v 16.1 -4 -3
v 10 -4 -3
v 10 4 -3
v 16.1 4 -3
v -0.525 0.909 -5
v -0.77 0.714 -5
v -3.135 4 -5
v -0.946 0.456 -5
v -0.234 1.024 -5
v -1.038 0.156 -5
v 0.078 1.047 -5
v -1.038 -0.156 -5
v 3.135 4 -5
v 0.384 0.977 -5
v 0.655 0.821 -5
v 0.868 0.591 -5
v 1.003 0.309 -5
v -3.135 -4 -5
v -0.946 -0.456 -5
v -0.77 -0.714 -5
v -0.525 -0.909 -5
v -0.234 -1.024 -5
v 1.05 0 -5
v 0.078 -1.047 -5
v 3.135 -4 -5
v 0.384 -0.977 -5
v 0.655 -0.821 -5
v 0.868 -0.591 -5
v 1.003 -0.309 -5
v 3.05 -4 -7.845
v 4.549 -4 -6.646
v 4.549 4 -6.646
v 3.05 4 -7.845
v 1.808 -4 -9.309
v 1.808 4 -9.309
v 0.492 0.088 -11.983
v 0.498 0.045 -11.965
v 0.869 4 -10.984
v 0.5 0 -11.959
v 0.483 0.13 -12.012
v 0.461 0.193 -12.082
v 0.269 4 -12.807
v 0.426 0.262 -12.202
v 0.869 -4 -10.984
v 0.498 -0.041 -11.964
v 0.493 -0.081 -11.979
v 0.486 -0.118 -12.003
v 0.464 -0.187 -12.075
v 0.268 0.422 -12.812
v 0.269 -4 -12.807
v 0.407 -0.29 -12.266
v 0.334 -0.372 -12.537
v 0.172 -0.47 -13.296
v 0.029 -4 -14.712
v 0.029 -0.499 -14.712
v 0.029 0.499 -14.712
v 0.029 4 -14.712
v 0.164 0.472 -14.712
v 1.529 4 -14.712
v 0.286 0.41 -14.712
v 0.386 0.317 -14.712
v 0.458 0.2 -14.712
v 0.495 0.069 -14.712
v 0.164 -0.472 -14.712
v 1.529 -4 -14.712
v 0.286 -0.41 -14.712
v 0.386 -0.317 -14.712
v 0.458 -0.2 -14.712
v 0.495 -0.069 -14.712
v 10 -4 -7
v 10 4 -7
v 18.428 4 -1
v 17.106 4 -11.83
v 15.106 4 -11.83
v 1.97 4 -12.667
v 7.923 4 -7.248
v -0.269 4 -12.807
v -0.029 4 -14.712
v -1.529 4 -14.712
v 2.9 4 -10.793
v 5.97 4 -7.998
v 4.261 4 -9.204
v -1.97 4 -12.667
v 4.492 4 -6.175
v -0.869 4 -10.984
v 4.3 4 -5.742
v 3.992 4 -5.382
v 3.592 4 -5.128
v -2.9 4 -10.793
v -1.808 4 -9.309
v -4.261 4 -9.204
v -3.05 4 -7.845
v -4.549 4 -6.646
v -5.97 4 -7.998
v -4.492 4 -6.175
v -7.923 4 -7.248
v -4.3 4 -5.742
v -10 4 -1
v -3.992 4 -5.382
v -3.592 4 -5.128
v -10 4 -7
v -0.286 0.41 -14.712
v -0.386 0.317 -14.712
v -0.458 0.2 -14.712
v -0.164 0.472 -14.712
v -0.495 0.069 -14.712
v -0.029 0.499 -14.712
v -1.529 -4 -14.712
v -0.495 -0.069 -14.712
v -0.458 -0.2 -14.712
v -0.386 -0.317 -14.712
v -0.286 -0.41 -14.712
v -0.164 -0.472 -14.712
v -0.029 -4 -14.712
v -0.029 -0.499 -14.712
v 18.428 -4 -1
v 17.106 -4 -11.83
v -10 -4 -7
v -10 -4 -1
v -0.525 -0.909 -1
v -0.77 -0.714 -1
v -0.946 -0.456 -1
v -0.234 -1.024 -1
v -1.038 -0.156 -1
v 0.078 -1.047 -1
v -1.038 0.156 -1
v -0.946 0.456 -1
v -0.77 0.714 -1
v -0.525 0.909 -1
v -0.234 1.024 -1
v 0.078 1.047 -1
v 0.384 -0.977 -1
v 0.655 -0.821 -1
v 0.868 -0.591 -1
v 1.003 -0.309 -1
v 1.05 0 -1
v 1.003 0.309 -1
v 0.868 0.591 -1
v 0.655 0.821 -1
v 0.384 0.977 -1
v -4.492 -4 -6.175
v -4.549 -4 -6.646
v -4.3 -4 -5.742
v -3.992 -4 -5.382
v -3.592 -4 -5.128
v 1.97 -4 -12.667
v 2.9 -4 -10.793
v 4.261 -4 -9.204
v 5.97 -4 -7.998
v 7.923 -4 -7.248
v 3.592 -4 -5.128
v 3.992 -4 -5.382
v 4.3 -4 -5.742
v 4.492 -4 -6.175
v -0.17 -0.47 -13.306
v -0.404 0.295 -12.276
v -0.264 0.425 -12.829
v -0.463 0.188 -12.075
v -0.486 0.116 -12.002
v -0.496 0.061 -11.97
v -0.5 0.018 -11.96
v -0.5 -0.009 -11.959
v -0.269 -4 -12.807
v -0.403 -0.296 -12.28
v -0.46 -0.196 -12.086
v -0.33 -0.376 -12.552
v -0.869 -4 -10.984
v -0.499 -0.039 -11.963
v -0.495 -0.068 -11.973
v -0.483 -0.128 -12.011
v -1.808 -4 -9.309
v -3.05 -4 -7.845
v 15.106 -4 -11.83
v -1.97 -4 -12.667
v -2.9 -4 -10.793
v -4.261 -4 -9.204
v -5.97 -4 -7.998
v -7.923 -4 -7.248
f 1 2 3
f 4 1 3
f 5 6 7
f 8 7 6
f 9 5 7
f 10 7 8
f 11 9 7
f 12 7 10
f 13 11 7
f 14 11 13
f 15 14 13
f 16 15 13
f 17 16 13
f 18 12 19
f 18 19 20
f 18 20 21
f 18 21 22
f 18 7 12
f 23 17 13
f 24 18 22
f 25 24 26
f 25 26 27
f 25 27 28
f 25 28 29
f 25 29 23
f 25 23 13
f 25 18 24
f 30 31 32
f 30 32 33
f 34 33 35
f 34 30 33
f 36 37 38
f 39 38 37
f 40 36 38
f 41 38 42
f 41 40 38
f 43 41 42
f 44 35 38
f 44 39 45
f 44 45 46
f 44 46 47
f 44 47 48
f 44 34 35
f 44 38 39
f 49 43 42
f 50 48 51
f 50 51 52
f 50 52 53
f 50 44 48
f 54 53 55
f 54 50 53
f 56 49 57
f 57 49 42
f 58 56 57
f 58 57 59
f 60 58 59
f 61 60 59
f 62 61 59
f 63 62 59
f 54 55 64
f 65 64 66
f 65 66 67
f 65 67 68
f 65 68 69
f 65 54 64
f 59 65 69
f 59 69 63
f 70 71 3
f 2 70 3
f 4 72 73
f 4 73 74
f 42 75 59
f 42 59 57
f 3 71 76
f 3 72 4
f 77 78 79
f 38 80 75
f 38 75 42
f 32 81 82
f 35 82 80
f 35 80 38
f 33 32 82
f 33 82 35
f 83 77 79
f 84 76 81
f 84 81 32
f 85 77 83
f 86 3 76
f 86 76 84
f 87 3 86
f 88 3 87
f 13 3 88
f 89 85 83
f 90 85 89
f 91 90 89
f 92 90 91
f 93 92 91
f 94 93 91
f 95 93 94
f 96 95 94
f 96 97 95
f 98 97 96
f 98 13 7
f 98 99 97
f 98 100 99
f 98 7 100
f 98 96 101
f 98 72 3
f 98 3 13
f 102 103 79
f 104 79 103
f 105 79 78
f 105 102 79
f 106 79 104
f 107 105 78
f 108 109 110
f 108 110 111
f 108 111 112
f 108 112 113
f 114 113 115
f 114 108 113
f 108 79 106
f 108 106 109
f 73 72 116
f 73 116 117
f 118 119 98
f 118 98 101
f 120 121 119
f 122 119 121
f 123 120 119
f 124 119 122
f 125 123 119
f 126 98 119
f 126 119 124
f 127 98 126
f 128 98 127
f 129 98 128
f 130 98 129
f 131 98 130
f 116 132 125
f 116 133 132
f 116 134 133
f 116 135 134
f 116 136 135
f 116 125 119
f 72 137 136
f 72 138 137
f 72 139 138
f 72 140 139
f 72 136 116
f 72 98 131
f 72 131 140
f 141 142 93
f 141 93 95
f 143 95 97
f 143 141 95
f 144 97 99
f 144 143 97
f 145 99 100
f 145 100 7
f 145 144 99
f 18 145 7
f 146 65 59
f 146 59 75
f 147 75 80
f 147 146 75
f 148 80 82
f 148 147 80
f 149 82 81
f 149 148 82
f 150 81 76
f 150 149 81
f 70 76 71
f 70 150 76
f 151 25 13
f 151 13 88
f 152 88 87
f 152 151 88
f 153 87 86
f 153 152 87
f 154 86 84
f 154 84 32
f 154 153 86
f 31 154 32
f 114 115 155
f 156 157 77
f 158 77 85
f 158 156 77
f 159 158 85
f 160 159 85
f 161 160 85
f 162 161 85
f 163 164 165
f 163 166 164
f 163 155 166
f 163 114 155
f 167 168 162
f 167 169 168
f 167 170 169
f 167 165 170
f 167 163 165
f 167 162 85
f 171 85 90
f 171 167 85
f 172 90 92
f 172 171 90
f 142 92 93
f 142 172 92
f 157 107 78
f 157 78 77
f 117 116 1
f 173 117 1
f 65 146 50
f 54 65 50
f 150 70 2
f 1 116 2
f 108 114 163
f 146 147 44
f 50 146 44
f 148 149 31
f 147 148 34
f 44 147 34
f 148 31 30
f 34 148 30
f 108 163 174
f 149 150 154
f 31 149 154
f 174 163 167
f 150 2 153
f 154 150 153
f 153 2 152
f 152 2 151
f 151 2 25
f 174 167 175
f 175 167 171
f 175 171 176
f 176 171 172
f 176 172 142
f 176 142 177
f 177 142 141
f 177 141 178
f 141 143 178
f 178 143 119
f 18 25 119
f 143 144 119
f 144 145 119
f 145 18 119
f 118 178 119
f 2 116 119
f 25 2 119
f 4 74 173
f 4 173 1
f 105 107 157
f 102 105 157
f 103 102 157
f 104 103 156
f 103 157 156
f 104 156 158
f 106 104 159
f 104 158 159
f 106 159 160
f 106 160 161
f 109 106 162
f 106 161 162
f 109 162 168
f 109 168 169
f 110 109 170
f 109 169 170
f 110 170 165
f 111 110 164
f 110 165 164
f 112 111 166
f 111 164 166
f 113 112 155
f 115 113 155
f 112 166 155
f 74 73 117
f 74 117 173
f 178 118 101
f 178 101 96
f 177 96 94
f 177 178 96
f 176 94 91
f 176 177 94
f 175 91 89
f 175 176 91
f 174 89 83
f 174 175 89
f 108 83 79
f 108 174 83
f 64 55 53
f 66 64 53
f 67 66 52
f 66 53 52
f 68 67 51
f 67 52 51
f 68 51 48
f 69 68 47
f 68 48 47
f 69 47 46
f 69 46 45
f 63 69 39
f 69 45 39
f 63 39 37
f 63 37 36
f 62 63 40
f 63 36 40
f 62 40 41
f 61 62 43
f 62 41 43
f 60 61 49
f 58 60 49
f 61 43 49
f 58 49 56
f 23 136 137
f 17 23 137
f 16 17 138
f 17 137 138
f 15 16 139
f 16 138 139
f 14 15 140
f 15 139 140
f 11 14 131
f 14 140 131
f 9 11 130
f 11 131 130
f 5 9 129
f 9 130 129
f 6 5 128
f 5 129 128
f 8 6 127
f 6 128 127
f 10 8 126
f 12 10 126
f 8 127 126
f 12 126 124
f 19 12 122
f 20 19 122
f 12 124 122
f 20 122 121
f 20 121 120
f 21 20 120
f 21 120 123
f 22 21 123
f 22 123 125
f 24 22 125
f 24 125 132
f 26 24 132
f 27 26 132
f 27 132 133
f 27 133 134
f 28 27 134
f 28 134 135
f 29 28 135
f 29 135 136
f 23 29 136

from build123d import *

# Parameters (mm, degrees)
F1_DEPTH = 4
F2_R     = 0.5
F3_DEPTH = 25
F2_R_2   = 1.05
F4_DEPTH = 10
F2_W     = 20
F2_H     = 8
F5_DEPTH = 6
F6_W     = 8
F6_H     = 2
F7_DEPTH = 6.1
F9_DEPTH = 8


with BuildPart() as f1:
    # F0 (on Front) → F1 (new body, symmetric)
    with BuildSketch(Plane.XZ):
        Polygon((-10, 5), (-10, -5), (-3.135451, -5), (3.135451, -5), (10, -5), (10, 5), align=None)
        with BuildLine():
            Line((10, -5), (3.135451, -5))
            ThreePointArc((3.135451, -5), (4.159274, -5.550715), (4.549477, -6.645814))
            ThreePointArc((4.549477, -6.645814), (1.298147, -10.123692), (0.029146, -14.712418))
            Line((0.029146, -14.712418), (1.529146, -14.712418))
            ThreePointArc((1.529146, -14.712418), (4.260677, -9.20442), (10, -7))
            Line((10, -7), (10, -5))
        make_face()
        with BuildLine():
            Line((-3.135451, -5), (-10, -5))
            Line((-10, -5), (-10, -7))
            ThreePointArc((-10, -7), (-4.260677, -9.20442), (-1.529146, -14.712418))
            Line((-1.529146, -14.712418), (-0.029146, -14.712418))
            ThreePointArc((-0.029146, -14.712418), (-1.298147, -10.123692), (-4.549477, -6.645814))
            ThreePointArc((-4.549477, -6.645814), (-4.159274, -5.550715), (-3.135451, -5))
        make_face()
    extrude(amount=F1_DEPTH, both=True)

    # F2 (on face) → F3 (cut)
    with BuildSketch(Plane.XY.offset(5)):
        Circle(F2_R)
    extrude(amount=-F3_DEPTH, mode=Mode.SUBTRACT)

    # F2 (on face) → F4 (cut)
    with BuildSketch(Plane.XY.offset(5)):
        Circle(F2_R_2)
        Circle(F2_R, mode=Mode.SUBTRACT)
    extrude(amount=-F4_DEPTH, mode=Mode.SUBTRACT)

    # F2 (on face) → F5 (cut)
    with BuildSketch(Plane.XY.offset(5)):
        Rectangle(F2_W, F2_H)
        Circle(F2_R_2, mode=Mode.SUBTRACT)
    extrude(amount=-F5_DEPTH, mode=Mode.SUBTRACT)

    # F6 (on face) → F7 (join)
    with BuildSketch(Plane.YZ.offset(10)):
        with Locations((0, -2)):
            Rectangle(F6_W, F6_H)
    extrude(amount=F7_DEPTH)

    # F8 (on face) → F9 (join)
    with BuildSketch(Plane(origin=(0, 4, 0), x_dir=(-1, 0, 0), z_dir=(0, 1, 0))):
        Polygon((-15.105671, -11.829939), (-16.1, -3), (-16.1, -1), (-18.428246, -1), (-17.105671, -11.829939), align=None)
    extrude(amount=-F9_DEPTH)


solid = f1.part
